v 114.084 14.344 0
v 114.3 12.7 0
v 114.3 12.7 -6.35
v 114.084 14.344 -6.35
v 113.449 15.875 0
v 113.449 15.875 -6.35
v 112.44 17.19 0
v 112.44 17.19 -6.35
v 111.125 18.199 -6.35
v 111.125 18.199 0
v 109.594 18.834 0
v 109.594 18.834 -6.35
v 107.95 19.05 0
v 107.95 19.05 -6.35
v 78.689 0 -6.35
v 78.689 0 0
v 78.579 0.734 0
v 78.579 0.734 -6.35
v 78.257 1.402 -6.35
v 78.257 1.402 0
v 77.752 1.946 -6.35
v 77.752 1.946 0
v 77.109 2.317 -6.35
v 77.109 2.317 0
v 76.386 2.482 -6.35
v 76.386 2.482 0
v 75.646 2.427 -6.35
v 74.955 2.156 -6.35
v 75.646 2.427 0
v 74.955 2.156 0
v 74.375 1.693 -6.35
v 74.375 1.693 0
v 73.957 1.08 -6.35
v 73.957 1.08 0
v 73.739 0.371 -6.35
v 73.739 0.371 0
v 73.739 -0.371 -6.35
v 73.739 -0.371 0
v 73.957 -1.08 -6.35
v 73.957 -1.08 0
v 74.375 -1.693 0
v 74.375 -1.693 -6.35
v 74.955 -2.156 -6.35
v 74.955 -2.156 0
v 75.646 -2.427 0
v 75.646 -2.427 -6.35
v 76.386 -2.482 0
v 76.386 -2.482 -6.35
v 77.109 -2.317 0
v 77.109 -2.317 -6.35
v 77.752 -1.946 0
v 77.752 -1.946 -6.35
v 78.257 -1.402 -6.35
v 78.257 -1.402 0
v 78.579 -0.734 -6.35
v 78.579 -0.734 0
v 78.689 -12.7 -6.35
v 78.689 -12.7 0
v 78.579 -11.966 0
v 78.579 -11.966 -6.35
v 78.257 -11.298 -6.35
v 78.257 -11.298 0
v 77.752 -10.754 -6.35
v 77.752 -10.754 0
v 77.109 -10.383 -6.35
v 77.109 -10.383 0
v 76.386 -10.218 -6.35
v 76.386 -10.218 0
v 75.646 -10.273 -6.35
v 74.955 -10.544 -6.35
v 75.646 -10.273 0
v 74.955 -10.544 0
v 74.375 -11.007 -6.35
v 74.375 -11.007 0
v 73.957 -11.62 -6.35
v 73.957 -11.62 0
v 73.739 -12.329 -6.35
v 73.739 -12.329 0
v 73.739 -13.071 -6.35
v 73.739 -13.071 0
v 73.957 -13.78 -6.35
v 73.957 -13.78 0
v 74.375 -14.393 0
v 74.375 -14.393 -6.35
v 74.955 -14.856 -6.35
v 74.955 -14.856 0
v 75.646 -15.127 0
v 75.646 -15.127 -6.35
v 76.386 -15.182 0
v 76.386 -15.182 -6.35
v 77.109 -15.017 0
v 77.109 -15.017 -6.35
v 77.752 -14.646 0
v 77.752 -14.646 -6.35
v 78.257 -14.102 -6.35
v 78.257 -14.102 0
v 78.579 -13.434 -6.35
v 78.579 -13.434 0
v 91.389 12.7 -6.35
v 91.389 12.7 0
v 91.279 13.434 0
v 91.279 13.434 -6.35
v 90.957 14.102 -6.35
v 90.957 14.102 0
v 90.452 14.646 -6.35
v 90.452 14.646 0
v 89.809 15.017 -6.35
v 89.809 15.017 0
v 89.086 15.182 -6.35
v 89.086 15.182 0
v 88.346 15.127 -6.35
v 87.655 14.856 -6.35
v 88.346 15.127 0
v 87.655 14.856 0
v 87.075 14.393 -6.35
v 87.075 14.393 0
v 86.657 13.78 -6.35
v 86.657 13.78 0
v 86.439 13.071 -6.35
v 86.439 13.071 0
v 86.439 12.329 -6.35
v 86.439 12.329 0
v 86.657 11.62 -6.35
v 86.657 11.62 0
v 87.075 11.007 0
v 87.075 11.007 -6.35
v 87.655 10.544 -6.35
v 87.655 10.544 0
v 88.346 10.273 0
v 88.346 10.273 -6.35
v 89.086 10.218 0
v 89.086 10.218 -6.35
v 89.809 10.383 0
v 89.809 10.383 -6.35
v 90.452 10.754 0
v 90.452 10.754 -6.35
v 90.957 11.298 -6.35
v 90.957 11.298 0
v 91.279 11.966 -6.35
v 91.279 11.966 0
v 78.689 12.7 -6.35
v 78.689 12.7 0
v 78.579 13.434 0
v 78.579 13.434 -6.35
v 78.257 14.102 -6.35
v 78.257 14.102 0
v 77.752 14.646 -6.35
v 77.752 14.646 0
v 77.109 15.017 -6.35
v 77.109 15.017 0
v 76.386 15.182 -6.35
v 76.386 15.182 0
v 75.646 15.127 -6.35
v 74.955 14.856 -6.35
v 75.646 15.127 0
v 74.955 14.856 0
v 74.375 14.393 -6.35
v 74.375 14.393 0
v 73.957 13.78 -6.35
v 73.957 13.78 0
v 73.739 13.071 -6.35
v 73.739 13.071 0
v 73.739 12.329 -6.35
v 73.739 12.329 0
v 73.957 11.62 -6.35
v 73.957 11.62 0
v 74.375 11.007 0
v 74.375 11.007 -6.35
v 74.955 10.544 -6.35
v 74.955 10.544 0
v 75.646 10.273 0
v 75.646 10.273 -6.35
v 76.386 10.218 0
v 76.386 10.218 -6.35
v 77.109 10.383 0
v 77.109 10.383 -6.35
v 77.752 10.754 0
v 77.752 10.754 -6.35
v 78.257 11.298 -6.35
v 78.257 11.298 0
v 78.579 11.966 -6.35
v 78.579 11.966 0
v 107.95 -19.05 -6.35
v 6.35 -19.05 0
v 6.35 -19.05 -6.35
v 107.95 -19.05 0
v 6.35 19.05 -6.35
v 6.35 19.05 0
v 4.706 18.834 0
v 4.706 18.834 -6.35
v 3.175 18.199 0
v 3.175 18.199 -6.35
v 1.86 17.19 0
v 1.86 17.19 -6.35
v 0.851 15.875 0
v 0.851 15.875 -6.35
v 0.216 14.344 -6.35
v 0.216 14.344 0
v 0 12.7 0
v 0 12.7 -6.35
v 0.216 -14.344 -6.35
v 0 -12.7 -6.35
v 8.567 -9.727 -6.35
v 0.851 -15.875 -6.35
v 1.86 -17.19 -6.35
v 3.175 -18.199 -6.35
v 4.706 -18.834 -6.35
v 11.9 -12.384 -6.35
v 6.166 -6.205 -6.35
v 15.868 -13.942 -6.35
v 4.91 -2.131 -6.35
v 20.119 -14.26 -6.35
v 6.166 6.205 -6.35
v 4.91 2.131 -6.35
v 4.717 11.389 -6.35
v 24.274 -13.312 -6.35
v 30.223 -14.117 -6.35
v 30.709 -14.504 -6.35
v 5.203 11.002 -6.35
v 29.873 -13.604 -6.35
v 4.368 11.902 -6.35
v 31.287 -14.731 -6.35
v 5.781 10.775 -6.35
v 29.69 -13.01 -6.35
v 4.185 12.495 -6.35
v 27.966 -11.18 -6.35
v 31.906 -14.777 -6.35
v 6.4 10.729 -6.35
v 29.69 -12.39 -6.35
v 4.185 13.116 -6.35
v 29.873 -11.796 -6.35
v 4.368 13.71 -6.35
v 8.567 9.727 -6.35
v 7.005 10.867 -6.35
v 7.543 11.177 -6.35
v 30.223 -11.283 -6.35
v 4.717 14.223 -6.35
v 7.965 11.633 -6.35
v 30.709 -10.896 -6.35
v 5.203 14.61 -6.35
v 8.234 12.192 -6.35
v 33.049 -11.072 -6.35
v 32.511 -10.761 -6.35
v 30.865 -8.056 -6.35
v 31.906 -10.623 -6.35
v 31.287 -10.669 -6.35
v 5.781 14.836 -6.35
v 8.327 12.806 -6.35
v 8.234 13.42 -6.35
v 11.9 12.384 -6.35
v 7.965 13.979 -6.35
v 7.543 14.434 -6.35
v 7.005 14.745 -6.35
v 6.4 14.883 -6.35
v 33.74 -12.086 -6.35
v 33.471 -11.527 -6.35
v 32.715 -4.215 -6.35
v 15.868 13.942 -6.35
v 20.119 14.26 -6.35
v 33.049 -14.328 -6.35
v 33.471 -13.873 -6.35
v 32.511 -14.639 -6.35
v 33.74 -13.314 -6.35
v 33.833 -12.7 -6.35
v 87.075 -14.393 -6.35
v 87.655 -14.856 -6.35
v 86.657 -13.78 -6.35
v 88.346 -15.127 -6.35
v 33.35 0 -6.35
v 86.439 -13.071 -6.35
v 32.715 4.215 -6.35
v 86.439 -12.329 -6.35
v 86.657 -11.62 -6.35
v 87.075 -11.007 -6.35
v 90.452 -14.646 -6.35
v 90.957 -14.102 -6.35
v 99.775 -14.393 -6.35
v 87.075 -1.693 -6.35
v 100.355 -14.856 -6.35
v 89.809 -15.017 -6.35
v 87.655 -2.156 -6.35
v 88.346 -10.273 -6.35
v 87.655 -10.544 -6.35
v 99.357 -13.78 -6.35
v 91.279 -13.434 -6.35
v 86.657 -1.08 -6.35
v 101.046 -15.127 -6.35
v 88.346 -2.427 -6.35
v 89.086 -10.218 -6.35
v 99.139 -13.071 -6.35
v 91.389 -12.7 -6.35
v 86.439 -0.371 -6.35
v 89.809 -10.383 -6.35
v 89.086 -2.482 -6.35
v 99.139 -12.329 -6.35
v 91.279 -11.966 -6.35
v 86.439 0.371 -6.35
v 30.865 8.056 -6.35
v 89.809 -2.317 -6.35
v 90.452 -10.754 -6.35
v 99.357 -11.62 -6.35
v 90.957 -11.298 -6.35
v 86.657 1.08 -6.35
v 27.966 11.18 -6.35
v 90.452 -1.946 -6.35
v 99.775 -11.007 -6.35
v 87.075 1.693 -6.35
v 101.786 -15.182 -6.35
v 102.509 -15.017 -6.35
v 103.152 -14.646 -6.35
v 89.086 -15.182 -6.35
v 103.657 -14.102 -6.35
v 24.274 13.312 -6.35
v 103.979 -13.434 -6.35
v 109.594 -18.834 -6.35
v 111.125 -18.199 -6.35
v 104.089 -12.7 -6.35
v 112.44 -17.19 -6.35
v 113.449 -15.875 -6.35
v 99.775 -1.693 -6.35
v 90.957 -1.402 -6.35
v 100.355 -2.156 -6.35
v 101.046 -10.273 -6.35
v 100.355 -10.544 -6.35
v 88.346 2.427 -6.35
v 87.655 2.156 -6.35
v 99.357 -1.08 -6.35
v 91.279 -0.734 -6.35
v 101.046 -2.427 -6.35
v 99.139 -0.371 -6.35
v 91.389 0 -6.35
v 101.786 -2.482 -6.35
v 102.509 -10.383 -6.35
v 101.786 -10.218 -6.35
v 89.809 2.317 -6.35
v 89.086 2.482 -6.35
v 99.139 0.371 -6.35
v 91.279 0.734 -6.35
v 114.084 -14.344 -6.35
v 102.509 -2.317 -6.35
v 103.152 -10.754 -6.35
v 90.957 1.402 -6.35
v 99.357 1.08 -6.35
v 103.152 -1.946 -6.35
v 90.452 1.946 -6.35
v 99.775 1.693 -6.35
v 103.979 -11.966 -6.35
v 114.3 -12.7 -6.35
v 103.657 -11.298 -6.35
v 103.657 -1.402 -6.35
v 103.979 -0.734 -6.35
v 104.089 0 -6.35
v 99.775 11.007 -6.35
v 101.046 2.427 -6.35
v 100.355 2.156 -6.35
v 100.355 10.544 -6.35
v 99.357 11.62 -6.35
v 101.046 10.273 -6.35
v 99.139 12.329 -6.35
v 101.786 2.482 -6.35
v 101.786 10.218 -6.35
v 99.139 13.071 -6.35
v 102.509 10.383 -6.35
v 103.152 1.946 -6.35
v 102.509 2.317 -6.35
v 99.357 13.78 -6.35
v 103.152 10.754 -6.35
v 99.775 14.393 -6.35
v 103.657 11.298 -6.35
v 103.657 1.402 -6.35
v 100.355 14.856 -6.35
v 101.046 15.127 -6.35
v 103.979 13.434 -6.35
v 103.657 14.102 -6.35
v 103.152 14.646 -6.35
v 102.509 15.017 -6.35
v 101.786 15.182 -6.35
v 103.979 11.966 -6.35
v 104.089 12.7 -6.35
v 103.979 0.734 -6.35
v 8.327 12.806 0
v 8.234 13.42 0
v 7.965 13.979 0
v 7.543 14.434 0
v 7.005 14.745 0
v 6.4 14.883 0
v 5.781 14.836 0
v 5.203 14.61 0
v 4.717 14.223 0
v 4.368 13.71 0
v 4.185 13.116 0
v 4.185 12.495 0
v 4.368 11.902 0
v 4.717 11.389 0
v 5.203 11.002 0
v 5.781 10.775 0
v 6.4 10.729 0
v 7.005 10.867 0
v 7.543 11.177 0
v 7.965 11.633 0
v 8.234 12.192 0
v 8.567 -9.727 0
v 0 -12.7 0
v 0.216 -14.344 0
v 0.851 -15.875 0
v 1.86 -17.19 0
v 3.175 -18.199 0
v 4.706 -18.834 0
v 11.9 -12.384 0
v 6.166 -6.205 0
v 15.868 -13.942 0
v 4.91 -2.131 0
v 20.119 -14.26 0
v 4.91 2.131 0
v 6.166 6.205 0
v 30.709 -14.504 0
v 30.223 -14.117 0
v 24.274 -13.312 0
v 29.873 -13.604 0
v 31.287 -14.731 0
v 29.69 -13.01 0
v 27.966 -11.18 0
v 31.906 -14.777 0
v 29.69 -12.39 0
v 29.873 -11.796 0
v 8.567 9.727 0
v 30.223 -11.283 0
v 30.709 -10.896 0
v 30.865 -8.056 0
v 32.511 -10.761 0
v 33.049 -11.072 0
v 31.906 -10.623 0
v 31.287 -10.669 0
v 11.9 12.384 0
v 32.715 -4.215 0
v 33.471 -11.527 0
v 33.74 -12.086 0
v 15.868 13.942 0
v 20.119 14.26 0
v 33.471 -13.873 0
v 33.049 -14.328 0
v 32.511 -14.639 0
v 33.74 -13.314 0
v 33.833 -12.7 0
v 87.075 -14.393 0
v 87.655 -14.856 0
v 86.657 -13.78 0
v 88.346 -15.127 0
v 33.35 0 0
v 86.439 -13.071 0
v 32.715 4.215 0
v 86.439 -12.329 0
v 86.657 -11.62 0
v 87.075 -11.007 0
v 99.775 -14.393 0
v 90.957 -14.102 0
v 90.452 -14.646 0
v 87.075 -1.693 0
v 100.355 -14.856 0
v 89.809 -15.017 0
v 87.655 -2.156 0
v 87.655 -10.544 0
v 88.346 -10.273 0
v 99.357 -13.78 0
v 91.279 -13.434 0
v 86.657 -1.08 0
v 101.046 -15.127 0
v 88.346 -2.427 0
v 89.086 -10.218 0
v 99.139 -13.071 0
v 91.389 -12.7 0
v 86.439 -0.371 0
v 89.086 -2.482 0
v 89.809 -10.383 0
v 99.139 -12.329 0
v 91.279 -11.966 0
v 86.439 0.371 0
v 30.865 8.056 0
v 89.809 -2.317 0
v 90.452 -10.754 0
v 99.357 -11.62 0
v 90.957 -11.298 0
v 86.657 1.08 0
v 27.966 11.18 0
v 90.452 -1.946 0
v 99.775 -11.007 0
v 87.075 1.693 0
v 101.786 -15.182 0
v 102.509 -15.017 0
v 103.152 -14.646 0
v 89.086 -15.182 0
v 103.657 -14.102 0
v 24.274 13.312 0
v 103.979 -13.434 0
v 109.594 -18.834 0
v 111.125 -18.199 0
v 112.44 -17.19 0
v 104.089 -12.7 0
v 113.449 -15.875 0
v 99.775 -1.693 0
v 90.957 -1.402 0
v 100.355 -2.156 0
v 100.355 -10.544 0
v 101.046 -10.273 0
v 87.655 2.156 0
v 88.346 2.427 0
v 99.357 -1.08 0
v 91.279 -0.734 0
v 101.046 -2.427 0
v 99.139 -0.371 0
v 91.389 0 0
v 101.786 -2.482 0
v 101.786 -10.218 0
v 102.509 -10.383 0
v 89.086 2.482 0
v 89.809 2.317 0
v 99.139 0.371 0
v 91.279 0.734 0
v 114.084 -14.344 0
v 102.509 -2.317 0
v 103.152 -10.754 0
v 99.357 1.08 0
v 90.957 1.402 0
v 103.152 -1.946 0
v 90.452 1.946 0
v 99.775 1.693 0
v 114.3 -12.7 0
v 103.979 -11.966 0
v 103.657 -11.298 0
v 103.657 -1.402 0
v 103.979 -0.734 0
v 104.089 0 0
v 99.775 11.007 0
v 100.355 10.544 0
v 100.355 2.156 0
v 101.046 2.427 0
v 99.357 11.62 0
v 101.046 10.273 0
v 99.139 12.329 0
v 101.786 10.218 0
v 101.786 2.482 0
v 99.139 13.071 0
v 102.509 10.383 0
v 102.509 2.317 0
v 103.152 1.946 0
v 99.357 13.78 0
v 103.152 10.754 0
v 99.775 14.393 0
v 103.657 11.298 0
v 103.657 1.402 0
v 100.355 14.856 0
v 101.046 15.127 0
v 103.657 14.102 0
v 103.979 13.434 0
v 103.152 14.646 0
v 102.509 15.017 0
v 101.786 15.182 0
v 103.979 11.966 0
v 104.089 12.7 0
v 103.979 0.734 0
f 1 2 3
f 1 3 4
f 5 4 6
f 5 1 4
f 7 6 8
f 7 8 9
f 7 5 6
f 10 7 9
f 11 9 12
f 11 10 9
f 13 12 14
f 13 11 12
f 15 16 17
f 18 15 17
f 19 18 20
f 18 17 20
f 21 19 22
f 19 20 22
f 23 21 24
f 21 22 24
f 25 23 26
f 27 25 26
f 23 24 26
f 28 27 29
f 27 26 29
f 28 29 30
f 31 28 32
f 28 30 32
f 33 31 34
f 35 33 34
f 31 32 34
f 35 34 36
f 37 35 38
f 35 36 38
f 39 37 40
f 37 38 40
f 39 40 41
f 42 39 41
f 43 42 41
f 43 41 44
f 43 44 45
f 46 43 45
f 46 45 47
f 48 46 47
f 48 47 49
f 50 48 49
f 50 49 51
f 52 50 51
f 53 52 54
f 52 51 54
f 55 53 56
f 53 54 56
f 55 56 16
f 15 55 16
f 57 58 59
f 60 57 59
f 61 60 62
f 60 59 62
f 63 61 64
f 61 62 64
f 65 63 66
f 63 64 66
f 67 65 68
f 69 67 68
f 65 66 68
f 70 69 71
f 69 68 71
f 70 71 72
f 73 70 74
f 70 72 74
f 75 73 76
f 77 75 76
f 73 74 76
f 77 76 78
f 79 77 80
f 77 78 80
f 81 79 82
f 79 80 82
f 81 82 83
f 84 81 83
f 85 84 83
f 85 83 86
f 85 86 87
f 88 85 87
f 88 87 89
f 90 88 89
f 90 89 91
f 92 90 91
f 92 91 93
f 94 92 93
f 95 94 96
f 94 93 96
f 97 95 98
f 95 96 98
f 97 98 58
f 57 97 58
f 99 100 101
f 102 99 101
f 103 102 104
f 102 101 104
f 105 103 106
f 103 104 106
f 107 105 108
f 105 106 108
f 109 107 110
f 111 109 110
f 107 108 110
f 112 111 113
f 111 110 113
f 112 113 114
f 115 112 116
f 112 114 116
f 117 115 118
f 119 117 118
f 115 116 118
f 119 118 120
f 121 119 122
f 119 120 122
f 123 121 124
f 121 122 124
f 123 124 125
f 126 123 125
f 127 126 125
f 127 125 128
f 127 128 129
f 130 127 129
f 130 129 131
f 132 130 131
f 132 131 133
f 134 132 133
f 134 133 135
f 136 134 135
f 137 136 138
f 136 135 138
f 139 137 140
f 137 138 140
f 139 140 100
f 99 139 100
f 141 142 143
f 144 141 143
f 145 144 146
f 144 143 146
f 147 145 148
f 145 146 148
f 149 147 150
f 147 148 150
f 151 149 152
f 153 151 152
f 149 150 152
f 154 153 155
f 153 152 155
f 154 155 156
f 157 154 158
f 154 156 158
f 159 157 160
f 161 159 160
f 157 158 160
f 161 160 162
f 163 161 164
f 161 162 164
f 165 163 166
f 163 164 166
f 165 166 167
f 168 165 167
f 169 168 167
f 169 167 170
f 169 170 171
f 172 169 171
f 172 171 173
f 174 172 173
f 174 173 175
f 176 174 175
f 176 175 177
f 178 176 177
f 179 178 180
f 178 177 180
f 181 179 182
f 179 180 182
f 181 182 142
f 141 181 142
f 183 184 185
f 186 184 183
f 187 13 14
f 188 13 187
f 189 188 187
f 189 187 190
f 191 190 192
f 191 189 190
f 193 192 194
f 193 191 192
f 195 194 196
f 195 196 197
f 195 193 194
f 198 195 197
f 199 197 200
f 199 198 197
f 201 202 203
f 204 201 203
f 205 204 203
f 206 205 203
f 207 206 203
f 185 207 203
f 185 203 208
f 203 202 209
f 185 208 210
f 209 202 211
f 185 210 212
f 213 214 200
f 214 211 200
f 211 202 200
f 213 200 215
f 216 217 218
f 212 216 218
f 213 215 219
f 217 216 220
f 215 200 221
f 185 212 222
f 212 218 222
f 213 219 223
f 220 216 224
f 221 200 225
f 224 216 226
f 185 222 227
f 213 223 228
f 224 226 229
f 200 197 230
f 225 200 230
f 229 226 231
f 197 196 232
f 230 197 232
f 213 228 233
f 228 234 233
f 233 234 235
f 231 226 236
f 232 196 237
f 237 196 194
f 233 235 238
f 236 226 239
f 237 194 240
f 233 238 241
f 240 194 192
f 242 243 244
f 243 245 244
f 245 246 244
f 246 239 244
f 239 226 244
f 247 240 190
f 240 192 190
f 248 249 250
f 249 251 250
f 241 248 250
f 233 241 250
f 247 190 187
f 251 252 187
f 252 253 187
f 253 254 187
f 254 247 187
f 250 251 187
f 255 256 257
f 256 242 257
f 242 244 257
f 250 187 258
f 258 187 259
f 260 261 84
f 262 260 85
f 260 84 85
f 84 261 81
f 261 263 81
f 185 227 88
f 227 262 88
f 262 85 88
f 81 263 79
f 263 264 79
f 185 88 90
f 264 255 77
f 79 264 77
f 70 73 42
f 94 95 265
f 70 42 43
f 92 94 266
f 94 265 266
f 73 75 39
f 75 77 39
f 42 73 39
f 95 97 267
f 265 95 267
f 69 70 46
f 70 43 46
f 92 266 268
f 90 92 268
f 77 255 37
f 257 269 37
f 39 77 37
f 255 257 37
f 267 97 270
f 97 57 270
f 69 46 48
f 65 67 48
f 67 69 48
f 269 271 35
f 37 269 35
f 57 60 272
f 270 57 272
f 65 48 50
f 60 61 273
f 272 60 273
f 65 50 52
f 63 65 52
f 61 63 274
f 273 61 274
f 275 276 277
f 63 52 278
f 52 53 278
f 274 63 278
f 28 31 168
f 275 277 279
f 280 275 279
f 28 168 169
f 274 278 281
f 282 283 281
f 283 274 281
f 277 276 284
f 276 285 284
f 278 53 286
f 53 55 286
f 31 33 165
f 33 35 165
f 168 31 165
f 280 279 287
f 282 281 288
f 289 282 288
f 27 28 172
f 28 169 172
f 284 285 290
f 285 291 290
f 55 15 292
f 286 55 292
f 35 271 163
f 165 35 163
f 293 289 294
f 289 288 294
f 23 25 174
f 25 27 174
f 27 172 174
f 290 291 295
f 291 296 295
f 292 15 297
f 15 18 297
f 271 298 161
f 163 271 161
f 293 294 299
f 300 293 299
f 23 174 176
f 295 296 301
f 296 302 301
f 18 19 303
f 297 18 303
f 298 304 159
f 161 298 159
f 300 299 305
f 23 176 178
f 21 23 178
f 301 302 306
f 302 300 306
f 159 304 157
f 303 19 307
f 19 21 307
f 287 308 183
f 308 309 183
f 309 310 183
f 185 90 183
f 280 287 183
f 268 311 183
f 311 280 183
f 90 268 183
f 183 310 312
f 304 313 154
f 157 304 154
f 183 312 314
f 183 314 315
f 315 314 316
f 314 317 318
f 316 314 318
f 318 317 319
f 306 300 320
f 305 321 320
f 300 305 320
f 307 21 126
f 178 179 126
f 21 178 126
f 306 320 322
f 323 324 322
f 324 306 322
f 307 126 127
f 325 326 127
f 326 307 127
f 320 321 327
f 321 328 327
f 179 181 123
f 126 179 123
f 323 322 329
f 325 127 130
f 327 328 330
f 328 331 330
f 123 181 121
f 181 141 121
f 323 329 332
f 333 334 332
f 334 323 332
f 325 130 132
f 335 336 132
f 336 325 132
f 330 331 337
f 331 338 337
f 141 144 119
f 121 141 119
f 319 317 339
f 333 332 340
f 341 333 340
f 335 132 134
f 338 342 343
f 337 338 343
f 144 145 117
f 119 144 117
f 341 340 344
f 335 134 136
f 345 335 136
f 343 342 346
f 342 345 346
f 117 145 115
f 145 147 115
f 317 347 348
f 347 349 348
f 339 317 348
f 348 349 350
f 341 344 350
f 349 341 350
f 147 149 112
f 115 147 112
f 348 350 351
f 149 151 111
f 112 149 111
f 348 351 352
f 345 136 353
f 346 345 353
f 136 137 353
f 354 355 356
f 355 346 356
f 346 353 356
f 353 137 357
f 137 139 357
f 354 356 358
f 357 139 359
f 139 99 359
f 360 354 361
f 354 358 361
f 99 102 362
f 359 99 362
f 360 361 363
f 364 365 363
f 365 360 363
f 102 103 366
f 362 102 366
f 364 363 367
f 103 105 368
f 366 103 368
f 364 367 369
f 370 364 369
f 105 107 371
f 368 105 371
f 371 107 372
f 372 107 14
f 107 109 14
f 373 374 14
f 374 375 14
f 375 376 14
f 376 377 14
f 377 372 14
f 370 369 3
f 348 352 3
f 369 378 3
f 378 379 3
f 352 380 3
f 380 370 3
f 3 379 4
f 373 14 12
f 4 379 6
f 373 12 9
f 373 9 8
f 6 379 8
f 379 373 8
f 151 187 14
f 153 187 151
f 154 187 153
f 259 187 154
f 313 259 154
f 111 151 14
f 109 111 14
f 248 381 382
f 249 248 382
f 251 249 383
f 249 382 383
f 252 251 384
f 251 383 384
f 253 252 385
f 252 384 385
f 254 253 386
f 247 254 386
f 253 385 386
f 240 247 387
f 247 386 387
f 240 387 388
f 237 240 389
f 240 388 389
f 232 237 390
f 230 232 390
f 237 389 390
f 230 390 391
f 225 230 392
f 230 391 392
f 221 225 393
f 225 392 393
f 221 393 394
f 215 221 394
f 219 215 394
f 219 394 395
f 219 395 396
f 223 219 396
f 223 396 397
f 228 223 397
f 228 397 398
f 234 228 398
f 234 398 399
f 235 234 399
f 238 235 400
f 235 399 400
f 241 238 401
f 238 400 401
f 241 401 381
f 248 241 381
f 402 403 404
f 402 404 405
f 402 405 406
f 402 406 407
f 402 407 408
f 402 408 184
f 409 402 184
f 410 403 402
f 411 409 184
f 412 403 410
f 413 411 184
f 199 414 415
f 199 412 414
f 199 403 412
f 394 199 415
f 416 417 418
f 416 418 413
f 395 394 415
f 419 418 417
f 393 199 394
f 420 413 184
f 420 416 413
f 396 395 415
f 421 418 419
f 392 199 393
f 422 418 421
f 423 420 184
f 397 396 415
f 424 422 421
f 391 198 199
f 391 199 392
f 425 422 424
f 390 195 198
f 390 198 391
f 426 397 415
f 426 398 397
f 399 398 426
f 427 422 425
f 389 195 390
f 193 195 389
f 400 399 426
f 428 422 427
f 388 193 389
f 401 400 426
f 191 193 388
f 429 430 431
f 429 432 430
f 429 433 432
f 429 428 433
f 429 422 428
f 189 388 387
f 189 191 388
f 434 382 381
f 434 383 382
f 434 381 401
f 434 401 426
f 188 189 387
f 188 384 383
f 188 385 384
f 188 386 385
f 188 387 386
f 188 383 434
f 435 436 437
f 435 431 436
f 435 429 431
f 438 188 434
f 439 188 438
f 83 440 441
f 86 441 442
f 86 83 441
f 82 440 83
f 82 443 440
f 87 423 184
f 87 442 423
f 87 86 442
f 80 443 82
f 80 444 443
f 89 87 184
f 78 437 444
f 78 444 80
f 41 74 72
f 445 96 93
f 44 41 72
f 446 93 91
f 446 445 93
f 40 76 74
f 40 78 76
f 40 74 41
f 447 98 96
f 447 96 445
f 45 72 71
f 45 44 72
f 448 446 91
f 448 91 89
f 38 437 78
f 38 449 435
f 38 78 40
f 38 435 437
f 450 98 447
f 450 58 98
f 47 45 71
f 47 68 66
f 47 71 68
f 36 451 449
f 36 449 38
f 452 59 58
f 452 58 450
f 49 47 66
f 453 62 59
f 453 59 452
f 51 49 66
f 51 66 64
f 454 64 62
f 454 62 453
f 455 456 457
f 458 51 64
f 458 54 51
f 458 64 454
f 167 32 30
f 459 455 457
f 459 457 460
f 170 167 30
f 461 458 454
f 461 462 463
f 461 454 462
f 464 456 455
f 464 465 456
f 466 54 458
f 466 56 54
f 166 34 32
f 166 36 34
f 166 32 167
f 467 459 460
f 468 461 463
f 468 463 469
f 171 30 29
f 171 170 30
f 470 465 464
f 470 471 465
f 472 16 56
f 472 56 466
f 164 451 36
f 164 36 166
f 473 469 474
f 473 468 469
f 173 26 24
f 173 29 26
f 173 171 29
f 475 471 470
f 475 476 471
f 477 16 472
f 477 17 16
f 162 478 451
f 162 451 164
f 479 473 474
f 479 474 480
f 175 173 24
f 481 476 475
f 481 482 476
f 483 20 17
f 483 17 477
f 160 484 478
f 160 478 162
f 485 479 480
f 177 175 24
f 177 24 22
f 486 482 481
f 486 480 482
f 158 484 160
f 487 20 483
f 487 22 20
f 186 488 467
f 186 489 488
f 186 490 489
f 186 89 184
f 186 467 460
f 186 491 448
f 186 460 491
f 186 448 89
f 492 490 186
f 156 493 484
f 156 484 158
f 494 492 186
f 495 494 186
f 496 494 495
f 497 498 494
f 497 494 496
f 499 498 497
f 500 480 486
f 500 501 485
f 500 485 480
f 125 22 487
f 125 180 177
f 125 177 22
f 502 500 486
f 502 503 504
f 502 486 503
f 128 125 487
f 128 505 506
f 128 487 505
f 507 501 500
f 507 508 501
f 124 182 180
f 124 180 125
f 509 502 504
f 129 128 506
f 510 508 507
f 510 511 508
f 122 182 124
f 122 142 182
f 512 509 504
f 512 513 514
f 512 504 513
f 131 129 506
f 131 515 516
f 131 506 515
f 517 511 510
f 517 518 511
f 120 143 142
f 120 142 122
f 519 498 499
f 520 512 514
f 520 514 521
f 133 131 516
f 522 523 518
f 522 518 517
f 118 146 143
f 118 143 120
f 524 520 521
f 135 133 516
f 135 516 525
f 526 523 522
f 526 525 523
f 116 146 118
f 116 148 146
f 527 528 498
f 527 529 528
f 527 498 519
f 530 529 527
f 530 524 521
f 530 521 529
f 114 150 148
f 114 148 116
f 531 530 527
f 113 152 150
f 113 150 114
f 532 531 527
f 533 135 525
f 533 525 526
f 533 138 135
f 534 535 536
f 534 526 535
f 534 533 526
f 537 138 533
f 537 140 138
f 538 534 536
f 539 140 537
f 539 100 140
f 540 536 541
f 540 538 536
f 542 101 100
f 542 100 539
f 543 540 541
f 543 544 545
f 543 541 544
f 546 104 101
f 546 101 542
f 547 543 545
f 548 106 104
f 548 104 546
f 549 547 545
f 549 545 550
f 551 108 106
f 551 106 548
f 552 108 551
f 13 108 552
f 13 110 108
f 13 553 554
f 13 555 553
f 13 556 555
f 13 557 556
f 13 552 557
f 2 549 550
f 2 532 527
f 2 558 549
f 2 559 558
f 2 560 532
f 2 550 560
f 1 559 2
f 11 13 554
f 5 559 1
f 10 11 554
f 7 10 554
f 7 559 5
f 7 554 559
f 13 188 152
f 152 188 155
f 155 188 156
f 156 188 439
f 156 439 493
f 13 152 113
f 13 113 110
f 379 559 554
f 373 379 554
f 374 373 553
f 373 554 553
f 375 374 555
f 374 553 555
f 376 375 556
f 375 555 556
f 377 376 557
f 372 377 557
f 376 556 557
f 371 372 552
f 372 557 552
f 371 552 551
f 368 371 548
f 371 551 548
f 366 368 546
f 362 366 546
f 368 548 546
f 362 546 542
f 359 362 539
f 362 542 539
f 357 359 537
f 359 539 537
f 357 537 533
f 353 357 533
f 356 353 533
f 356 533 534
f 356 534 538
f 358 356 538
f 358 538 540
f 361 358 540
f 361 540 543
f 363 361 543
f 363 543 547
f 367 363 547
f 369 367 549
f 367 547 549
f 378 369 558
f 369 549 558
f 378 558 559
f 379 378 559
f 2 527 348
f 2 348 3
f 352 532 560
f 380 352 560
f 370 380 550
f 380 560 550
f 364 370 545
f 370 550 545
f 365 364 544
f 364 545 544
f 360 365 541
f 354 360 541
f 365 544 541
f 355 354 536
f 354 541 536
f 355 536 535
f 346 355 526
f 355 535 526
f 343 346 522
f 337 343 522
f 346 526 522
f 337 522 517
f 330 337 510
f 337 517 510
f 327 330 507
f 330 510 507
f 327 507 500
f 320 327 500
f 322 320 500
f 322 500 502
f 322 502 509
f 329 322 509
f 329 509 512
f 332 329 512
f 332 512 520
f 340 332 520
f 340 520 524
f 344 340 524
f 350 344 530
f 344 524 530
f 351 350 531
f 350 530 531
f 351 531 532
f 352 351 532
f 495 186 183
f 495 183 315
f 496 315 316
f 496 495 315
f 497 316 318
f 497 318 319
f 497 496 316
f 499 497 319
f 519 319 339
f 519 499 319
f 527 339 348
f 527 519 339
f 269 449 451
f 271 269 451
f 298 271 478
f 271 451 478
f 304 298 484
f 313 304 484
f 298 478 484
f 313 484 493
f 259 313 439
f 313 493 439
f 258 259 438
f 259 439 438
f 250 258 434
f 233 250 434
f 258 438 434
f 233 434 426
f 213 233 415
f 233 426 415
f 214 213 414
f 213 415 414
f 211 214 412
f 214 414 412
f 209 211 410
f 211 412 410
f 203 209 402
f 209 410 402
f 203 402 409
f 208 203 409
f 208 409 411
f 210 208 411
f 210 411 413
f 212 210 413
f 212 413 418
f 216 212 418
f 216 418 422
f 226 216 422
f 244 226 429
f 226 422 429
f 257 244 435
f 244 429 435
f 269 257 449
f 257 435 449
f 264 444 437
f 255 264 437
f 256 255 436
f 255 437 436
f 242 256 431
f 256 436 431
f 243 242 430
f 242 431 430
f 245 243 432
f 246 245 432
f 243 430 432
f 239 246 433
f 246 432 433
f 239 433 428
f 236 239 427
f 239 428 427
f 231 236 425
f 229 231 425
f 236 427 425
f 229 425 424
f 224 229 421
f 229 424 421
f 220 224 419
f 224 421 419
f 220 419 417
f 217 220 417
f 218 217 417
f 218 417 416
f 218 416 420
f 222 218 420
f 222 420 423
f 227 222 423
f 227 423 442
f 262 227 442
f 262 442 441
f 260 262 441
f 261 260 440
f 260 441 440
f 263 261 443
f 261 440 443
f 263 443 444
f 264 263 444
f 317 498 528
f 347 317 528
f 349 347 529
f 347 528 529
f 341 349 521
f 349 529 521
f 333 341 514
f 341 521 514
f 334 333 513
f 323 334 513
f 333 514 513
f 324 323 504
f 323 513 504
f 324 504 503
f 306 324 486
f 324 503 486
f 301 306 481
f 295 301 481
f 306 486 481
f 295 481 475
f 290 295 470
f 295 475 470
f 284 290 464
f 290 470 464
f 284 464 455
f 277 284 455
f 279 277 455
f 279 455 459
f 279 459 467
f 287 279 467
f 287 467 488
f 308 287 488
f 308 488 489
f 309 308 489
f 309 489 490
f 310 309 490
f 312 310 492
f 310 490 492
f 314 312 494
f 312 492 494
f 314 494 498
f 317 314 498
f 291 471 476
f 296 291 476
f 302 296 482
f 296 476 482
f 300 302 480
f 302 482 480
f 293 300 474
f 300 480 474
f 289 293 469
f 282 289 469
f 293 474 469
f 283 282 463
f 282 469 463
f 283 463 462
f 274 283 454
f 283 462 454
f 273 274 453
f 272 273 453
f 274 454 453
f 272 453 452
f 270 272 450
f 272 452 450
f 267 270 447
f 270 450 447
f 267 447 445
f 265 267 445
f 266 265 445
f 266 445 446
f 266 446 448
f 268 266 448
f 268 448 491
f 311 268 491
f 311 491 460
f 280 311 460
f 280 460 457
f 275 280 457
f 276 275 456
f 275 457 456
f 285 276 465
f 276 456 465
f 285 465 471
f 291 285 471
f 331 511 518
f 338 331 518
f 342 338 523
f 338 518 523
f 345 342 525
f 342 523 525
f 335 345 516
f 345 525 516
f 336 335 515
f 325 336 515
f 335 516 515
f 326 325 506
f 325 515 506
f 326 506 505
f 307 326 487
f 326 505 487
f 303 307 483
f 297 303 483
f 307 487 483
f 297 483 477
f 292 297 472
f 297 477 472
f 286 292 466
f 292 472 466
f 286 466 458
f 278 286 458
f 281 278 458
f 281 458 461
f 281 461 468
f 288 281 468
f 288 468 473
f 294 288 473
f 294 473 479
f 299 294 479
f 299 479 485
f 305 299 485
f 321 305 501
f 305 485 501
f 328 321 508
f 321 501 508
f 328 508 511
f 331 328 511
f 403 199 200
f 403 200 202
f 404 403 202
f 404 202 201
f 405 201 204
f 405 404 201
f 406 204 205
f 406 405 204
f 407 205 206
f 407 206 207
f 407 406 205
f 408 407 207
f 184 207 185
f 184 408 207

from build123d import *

# Parameters (mm, degrees)
SKETCH1_R           = 14.3002
SKETCH1_R_2         = 2.0828
SKETCH1_R_3         = 2.4892
BOSS_EXTRUDE1_DEPTH = 6.35


with BuildPart() as part:
    # Sketch1 → Boss-Extrude1 (new body)
    with BuildSketch(Plane.XY):
        with BuildLine():
            Line((114.3, -12.7), (114.3, 12.7))
            ThreePointArc((114.3, 12.7), (112.440128061, 17.190128061), (107.95, 19.05))
            Line((107.95, 19.05), (6.35, 19.05))
            ThreePointArc((6.35, 19.05), (1.859871939, 17.190128061), (0, 12.7))
            Line((0, 12.7), (0, -12.7))
            ThreePointArc((0, -12.7), (1.859871939, -17.190128061), (6.35, -19.05))
            Line((6.35, -19.05), (107.95, -19.05))
            ThreePointArc((107.95, -19.05), (112.440128061, -17.190128061), (114.3, -12.7))
        make_face()
        with Locations((19.05, 0)):
            Circle(SKETCH1_R, mode=Mode.SUBTRACT)
        with Locations((6.244154771, 12.805845229)):
            Circle(SKETCH1_R_2, mode=Mode.SUBTRACT)
        with Locations((31.75, -12.7)):
            Circle(SKETCH1_R_2, mode=Mode.SUBTRACT)
        with Locations((88.9, 12.7)):
            Circle(SKETCH1_R_3, mode=Mode.SUBTRACT)
        with Locations((101.6, 12.7)):
            Circle(SKETCH1_R_3, mode=Mode.SUBTRACT)
        with Locations((88.9, 0)):
            Circle(SKETCH1_R_3, mode=Mode.SUBTRACT)
        with Locations((101.6, 0)):
            Circle(SKETCH1_R_3, mode=Mode.SUBTRACT)
        with Locations((88.9, -12.7)):
            Circle(SKETCH1_R_3, mode=Mode.SUBTRACT)
        with Locations((76.2, 12.7)):
            Circle(SKETCH1_R_3, mode=Mode.SUBTRACT)
        with Locations((101.6, -12.7)):
            Circle(SKETCH1_R_3, mode=Mode.SUBTRACT)
        with Locations((76.2, 0)):
            Circle(SKETCH1_R_3, mode=Mode.SUBTRACT)
        with Locations((76.2, -12.7)):
            Circle(SKETCH1_R_3, mode=Mode.SUBTRACT)
    extrude(amount=-BOSS_EXTRUDE1_DEPTH)


solid = part.part
